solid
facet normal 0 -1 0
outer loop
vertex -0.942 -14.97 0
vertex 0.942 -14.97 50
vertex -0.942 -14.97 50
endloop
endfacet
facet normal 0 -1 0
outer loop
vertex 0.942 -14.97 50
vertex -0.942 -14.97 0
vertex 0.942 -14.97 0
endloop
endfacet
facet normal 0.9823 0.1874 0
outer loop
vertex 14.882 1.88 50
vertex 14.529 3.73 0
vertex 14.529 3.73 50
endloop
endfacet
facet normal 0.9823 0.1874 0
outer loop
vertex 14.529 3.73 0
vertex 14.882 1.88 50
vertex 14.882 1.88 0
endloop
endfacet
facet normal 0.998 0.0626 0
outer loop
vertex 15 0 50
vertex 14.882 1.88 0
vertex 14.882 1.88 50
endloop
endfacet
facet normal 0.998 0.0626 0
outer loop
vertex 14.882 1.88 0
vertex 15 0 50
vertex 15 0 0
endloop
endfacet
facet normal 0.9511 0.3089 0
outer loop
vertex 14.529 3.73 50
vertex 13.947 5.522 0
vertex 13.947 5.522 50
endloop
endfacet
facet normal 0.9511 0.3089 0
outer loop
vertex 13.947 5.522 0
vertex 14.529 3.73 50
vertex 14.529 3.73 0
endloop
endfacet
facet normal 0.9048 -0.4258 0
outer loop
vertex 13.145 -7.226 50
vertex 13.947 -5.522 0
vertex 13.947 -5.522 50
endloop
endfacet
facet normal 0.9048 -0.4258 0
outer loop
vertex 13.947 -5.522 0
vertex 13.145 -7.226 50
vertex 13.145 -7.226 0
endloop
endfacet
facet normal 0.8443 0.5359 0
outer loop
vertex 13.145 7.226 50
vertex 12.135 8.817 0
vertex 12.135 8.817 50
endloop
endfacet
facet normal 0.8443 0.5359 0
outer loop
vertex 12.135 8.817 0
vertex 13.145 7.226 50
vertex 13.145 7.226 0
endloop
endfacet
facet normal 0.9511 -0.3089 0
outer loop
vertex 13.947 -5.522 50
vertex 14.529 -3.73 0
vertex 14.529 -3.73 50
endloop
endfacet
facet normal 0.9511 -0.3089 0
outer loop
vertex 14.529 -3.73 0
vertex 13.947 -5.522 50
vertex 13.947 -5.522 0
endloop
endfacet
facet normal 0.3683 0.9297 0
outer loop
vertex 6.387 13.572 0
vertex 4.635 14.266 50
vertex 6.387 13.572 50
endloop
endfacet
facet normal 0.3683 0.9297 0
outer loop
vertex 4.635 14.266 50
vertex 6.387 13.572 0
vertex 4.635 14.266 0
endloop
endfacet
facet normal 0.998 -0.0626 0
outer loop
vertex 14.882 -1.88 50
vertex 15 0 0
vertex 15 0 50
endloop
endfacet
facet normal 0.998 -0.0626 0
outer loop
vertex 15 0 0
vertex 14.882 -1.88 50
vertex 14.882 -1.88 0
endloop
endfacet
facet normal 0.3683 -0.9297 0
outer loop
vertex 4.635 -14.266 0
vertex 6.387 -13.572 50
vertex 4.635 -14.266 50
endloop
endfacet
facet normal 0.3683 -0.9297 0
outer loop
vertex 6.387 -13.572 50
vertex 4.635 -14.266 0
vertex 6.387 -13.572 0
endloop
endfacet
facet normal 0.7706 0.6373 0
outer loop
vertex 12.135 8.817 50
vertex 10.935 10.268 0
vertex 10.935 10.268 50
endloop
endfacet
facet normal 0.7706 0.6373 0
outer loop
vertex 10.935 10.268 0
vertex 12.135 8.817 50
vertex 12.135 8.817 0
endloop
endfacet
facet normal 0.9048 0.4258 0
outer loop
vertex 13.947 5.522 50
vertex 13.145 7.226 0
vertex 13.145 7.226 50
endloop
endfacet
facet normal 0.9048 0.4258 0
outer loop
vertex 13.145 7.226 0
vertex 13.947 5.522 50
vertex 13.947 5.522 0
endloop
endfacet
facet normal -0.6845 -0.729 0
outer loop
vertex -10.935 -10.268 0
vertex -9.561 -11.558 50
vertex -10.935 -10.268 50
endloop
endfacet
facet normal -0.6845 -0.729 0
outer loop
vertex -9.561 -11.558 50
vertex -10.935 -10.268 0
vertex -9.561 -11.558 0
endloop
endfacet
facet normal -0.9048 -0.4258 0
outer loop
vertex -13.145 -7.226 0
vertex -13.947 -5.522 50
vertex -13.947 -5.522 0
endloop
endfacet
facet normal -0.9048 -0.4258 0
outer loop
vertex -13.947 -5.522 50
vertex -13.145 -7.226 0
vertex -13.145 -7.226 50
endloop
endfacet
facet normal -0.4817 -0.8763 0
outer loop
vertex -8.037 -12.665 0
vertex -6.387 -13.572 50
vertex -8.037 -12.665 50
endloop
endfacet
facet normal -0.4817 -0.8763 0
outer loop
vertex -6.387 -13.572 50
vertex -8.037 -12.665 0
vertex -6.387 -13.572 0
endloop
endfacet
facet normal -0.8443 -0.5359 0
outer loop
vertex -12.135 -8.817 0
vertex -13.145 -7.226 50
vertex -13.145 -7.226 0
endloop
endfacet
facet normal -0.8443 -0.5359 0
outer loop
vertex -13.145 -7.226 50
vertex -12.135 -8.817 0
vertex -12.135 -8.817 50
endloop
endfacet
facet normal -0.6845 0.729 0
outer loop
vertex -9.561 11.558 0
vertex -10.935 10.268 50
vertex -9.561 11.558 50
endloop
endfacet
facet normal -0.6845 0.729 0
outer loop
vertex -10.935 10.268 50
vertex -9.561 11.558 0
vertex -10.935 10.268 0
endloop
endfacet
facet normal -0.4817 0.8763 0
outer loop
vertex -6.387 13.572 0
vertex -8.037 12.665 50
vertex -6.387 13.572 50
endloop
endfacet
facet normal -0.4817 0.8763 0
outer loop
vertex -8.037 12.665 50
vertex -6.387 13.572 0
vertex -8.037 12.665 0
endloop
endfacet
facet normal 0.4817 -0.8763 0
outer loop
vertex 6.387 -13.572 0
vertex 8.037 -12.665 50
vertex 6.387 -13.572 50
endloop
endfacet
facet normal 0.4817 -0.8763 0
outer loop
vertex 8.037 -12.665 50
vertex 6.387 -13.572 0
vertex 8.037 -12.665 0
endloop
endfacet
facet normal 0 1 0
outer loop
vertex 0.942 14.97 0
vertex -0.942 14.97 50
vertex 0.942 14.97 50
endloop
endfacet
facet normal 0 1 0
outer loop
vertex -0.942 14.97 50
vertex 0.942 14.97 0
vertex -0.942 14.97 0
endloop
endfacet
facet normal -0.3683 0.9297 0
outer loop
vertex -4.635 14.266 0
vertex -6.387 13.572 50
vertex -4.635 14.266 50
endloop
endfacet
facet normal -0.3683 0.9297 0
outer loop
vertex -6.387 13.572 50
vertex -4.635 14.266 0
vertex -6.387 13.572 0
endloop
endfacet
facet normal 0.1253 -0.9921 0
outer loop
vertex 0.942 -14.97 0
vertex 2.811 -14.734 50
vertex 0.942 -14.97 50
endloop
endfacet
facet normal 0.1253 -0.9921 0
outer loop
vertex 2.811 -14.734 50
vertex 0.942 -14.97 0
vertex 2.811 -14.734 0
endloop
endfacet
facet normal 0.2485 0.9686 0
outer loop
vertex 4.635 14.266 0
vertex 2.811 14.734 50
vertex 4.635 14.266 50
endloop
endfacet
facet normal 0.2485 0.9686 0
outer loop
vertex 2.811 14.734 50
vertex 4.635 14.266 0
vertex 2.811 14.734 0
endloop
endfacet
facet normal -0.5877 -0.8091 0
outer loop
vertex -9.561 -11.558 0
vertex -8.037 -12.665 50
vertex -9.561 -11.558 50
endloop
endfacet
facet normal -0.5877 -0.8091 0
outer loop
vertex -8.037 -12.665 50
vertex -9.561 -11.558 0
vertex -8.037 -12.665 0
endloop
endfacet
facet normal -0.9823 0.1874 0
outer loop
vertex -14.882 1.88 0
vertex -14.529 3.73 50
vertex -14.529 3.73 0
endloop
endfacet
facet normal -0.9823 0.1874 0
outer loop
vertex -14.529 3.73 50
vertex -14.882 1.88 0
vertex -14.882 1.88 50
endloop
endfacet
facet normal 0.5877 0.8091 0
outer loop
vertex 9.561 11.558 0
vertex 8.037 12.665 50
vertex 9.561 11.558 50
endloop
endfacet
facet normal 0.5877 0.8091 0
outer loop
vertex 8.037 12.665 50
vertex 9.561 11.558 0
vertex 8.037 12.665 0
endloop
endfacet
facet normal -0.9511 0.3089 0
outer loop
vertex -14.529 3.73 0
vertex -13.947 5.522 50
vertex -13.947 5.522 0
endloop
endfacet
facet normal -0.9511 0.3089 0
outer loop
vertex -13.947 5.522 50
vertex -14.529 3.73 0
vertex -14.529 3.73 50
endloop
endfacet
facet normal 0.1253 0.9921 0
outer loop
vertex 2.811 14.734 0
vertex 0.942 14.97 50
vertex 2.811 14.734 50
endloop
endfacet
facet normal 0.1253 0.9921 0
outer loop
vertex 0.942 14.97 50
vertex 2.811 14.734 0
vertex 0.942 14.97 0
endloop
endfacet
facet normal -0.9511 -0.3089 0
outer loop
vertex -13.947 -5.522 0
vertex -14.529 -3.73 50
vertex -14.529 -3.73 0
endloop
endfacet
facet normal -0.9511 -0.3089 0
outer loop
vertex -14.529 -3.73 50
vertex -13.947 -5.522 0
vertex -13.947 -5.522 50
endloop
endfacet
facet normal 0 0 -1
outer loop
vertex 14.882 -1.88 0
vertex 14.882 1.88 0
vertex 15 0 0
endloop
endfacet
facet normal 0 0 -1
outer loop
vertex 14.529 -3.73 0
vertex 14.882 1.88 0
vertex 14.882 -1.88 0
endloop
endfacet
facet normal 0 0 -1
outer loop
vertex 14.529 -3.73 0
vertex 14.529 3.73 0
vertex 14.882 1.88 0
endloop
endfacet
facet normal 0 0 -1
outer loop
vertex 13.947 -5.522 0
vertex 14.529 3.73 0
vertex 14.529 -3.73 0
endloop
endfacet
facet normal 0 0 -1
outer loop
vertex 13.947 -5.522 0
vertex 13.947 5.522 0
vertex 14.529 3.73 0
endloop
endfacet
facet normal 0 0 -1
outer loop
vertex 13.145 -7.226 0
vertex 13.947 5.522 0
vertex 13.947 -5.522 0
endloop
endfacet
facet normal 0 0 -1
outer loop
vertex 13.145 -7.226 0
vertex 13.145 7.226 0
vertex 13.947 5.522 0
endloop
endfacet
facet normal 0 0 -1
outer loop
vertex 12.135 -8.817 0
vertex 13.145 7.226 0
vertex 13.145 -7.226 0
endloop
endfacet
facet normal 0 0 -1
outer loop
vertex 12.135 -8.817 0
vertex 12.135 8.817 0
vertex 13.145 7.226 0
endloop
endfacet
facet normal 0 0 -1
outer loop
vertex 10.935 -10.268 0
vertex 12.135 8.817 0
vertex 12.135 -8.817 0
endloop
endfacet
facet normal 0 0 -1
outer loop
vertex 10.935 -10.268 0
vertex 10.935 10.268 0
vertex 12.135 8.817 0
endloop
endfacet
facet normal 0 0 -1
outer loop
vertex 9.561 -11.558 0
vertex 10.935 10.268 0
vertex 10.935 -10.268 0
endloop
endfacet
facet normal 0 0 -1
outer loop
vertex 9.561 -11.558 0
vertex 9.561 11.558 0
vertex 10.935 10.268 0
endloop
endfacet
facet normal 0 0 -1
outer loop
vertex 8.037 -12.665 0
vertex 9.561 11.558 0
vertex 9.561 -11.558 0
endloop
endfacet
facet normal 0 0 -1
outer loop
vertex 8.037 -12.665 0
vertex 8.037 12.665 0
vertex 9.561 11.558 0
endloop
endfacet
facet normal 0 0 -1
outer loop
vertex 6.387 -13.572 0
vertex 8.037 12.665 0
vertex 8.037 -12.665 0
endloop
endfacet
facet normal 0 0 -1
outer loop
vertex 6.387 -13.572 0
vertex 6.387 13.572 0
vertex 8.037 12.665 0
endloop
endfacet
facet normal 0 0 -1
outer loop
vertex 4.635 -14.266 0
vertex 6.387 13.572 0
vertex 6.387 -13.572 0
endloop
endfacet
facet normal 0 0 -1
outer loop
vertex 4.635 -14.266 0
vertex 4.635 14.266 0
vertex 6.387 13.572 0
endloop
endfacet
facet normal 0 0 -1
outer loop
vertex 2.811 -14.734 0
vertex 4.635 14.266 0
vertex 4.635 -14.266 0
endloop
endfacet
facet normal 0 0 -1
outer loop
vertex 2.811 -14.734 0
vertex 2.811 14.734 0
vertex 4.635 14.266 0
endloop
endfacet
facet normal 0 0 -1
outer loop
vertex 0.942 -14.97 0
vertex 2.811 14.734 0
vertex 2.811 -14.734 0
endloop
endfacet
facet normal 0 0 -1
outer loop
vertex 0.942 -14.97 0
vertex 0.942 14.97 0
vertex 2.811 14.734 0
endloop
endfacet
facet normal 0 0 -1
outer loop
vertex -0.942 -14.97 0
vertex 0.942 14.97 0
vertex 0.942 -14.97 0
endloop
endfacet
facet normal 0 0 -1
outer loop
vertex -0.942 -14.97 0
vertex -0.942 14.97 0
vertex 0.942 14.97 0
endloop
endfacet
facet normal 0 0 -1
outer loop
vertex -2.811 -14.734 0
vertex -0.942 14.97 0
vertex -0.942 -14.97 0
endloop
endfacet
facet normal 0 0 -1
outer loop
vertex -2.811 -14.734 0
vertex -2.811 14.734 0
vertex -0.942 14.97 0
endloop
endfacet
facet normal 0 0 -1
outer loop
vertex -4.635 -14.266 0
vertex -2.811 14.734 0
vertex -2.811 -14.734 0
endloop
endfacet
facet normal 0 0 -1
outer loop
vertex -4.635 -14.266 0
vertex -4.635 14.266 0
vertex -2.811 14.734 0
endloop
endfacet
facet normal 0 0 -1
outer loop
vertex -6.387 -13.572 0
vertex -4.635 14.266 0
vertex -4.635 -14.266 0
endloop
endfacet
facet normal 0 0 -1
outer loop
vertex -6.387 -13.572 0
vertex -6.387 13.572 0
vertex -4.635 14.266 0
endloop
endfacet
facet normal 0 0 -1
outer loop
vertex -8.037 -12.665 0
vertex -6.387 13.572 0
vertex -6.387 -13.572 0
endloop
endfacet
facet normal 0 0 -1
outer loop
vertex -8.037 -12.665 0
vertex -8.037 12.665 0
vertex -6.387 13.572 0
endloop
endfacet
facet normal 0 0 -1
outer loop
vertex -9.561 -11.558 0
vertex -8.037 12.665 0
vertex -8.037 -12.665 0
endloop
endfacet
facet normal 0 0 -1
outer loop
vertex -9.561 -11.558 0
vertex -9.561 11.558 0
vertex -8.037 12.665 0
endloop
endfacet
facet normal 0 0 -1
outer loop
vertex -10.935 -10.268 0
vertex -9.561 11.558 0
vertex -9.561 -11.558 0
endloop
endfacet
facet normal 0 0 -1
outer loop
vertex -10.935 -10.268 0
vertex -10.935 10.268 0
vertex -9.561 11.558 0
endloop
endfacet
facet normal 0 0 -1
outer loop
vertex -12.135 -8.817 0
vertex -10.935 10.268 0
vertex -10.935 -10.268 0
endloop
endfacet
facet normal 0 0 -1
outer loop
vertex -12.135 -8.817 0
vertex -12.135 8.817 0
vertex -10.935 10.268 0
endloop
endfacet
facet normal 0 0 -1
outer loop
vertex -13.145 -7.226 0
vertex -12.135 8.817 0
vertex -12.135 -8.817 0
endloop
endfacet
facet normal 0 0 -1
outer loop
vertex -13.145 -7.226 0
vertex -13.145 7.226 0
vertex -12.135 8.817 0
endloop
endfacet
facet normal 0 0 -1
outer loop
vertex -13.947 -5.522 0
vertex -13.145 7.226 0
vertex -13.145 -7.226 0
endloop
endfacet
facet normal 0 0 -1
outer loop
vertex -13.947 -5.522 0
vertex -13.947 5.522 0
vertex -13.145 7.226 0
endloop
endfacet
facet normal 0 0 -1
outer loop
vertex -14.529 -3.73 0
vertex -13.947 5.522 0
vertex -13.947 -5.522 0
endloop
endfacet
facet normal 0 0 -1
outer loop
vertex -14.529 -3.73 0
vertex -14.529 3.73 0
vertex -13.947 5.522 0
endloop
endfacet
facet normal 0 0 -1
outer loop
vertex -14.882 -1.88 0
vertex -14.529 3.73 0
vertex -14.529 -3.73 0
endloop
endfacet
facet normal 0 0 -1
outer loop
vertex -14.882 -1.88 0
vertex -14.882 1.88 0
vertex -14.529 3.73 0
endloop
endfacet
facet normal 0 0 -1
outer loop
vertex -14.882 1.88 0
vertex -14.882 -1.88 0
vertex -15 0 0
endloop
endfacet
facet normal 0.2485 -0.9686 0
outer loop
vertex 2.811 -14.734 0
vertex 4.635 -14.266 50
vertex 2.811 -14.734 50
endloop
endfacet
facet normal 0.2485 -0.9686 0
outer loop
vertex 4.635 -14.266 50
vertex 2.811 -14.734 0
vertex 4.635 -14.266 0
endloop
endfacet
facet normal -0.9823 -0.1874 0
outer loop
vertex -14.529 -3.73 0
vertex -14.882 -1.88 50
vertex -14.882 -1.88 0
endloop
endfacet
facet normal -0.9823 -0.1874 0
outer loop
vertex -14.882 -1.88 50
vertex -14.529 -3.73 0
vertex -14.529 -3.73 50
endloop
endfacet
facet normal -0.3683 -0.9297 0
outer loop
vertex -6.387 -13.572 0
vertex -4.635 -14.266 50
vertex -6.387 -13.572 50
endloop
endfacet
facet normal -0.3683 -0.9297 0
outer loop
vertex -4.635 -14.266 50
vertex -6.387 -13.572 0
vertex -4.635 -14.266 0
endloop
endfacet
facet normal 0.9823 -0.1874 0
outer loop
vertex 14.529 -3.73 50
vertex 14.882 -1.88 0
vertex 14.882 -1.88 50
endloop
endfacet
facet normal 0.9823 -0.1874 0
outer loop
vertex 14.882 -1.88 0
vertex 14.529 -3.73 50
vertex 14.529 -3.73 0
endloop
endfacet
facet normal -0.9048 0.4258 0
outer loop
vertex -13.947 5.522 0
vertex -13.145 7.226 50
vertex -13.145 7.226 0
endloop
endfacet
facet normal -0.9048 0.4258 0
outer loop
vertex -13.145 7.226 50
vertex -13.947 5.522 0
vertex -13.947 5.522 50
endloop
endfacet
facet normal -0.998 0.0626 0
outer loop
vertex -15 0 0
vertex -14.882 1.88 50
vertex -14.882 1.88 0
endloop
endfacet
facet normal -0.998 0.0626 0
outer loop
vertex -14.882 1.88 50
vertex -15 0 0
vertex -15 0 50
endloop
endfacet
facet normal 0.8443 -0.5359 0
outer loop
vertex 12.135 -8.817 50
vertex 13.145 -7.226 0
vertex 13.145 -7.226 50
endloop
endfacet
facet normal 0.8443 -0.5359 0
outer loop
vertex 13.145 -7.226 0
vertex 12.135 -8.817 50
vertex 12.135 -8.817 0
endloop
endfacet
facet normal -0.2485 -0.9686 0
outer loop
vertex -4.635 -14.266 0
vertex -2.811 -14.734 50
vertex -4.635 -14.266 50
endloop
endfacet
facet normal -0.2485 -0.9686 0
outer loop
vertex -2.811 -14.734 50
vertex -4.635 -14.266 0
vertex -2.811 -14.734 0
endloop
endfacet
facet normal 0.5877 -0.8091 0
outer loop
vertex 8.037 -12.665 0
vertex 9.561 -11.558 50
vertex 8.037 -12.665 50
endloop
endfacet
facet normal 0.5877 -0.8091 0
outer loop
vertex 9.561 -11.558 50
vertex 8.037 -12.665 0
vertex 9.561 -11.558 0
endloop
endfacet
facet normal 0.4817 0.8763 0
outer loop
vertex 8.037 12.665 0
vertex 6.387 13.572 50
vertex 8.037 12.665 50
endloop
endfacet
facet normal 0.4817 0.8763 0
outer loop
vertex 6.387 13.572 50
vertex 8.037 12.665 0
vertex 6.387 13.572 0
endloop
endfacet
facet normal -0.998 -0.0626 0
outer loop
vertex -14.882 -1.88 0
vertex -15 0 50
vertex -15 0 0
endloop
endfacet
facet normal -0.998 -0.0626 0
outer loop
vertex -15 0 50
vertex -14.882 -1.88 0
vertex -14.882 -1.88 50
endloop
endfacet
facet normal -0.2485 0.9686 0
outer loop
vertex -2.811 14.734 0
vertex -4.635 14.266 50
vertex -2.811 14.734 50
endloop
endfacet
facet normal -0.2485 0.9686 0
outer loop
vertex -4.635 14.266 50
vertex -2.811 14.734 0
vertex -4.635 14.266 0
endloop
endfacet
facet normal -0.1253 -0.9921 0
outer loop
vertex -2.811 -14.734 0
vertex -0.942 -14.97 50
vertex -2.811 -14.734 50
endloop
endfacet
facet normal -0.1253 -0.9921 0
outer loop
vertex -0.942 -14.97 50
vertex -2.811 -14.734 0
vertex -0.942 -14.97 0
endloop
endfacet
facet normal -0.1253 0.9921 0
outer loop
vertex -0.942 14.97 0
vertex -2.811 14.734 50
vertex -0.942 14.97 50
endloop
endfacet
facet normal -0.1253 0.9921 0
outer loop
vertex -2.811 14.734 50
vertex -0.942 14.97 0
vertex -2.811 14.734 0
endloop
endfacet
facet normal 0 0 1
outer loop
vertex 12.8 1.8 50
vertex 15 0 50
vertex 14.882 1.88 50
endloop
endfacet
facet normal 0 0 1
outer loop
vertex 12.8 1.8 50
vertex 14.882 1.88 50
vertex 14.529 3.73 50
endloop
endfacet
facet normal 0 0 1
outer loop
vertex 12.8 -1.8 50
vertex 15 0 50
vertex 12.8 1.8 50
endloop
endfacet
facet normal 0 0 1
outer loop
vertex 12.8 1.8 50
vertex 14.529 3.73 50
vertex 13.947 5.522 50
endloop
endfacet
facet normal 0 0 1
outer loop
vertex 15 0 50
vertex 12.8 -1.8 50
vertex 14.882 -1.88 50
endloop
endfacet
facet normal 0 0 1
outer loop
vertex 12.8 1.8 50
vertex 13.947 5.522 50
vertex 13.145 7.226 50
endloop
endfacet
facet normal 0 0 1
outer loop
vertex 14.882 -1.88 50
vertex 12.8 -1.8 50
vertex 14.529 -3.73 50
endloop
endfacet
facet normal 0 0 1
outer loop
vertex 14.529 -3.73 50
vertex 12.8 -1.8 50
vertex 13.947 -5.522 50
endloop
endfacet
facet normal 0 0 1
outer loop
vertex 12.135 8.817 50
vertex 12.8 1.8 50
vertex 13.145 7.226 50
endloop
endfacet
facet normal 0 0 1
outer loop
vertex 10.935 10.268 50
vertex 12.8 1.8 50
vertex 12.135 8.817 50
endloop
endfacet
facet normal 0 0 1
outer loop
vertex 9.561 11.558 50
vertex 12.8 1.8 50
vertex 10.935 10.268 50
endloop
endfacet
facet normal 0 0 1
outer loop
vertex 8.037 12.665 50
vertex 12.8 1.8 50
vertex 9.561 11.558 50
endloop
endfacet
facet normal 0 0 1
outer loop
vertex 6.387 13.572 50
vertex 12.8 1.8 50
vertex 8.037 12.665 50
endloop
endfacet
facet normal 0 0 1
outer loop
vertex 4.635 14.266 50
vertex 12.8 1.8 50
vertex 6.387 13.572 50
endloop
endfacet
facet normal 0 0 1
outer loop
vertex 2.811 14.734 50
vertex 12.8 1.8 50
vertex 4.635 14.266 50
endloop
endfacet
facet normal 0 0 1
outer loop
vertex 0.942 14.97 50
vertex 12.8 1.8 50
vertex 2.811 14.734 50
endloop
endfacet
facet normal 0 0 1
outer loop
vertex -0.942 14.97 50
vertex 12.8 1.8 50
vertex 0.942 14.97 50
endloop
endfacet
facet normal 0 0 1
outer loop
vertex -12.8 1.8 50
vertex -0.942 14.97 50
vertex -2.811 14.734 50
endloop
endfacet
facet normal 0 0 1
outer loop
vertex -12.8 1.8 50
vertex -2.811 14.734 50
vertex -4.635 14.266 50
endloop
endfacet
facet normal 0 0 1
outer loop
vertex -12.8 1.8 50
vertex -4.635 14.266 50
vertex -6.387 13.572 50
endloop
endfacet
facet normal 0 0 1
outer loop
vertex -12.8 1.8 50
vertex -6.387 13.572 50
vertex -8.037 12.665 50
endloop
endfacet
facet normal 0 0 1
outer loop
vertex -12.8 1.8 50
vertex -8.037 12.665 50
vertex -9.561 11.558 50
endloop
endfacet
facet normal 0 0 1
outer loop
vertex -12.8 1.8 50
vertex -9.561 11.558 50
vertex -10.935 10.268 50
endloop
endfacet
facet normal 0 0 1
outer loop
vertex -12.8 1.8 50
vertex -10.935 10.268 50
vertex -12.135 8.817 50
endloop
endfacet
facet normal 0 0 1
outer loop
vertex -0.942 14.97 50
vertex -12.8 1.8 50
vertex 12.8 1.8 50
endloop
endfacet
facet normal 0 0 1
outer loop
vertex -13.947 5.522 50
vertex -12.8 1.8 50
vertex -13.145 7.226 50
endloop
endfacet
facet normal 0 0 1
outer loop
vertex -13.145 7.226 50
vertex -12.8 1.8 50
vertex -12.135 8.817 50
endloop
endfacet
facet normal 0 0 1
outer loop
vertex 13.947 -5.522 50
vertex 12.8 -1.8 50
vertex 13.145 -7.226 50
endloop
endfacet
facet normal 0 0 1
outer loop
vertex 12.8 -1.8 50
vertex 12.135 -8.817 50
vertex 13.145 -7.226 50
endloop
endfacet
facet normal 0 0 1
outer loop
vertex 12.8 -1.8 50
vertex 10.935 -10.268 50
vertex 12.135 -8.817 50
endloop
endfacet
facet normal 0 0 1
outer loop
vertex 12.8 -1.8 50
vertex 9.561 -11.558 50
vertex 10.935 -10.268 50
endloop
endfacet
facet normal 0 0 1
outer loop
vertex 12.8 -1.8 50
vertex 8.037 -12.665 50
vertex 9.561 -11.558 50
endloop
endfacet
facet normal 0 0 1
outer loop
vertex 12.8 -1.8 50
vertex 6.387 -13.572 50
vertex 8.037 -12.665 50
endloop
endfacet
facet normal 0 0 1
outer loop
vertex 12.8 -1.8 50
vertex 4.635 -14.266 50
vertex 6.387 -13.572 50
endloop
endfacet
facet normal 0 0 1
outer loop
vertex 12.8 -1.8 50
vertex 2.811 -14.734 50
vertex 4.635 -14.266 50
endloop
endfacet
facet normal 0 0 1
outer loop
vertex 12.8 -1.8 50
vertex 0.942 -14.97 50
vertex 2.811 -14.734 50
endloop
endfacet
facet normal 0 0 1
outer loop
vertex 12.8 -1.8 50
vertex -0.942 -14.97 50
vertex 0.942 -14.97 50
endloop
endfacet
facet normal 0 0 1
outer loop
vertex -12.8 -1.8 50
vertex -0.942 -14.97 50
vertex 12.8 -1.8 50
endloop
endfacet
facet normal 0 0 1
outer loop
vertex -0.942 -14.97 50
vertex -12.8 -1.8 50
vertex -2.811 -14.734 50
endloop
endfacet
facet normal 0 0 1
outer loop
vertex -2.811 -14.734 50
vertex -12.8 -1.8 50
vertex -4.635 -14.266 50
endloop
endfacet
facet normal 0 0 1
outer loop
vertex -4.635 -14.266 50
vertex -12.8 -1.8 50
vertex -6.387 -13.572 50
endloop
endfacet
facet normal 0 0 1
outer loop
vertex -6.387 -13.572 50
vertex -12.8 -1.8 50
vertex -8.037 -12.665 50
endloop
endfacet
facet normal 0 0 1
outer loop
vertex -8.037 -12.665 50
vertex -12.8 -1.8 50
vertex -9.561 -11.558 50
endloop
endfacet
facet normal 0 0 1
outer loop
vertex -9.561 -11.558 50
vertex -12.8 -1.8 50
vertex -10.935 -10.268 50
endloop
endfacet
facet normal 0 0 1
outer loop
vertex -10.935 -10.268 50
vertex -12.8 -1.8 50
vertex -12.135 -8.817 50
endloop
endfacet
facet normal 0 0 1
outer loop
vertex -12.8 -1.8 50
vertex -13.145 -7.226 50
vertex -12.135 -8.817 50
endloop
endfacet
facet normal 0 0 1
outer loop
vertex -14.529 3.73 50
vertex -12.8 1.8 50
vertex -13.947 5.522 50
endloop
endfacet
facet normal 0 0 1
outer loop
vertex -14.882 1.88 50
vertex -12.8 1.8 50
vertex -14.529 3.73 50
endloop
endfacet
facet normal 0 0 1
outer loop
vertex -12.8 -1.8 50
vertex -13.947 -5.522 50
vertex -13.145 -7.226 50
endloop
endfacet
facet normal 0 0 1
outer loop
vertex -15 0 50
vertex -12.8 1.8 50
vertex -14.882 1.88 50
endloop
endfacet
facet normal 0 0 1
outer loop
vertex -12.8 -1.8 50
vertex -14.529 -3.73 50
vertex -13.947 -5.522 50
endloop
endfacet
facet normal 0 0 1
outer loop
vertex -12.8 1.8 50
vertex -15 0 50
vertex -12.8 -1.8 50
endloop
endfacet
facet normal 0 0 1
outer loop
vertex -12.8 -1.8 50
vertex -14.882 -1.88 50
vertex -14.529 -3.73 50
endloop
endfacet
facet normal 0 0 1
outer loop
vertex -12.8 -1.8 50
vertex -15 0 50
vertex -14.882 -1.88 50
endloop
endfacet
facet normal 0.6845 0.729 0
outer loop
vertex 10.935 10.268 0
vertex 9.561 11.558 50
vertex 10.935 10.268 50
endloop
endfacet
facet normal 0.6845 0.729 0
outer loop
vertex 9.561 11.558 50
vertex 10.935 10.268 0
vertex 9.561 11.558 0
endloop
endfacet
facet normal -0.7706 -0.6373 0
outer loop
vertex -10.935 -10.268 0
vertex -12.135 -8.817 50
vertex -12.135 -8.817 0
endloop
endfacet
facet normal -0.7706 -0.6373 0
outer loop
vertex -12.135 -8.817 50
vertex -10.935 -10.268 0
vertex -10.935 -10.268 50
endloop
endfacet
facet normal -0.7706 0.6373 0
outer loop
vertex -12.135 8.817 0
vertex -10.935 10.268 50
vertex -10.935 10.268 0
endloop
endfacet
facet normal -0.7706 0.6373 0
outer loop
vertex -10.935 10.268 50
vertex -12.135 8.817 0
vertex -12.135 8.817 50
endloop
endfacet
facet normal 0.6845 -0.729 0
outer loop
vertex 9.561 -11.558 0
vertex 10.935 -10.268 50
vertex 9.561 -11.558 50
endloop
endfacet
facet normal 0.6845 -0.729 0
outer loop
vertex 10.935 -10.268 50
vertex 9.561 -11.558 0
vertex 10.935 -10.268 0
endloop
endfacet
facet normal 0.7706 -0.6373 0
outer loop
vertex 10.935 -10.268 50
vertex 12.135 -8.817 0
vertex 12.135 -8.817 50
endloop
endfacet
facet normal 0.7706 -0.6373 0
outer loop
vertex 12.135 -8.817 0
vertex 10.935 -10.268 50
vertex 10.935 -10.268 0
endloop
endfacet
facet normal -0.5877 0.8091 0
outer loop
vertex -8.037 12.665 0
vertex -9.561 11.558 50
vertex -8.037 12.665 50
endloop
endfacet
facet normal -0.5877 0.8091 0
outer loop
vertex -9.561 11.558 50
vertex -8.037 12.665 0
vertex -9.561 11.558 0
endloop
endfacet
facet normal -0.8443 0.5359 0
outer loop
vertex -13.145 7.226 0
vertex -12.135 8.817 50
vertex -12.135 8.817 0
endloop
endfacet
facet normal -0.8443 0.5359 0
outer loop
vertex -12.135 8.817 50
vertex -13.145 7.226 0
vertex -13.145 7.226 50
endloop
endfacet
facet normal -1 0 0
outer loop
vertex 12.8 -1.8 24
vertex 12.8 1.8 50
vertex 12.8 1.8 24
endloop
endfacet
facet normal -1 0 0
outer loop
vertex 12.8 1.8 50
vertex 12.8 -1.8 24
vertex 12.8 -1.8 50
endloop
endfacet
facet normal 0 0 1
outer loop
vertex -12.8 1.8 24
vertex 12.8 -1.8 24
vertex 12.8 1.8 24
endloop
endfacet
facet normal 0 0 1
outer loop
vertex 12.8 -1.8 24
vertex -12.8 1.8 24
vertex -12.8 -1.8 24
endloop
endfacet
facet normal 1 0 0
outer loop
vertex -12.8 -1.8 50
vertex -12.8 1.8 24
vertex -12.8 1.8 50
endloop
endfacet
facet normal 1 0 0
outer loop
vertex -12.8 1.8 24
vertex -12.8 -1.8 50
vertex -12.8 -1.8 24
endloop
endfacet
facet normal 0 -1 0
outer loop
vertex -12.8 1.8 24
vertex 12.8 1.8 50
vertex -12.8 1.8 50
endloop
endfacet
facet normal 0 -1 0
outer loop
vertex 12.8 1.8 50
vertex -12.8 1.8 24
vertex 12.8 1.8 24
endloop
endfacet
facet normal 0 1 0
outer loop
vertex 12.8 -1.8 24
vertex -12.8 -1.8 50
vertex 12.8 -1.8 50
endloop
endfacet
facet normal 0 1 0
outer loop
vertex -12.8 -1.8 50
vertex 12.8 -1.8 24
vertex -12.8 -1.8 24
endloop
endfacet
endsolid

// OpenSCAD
difference() {
  cylinder(h = 50, r = 15);
  translate([-12.8, 0, 0]) {
    translate([0, -1.8, 0]) {
      translate([0, 0, 24]) {
        cube([25.6, 3.6, 27]);
      }
    }
  }
}
$fn = 50;
